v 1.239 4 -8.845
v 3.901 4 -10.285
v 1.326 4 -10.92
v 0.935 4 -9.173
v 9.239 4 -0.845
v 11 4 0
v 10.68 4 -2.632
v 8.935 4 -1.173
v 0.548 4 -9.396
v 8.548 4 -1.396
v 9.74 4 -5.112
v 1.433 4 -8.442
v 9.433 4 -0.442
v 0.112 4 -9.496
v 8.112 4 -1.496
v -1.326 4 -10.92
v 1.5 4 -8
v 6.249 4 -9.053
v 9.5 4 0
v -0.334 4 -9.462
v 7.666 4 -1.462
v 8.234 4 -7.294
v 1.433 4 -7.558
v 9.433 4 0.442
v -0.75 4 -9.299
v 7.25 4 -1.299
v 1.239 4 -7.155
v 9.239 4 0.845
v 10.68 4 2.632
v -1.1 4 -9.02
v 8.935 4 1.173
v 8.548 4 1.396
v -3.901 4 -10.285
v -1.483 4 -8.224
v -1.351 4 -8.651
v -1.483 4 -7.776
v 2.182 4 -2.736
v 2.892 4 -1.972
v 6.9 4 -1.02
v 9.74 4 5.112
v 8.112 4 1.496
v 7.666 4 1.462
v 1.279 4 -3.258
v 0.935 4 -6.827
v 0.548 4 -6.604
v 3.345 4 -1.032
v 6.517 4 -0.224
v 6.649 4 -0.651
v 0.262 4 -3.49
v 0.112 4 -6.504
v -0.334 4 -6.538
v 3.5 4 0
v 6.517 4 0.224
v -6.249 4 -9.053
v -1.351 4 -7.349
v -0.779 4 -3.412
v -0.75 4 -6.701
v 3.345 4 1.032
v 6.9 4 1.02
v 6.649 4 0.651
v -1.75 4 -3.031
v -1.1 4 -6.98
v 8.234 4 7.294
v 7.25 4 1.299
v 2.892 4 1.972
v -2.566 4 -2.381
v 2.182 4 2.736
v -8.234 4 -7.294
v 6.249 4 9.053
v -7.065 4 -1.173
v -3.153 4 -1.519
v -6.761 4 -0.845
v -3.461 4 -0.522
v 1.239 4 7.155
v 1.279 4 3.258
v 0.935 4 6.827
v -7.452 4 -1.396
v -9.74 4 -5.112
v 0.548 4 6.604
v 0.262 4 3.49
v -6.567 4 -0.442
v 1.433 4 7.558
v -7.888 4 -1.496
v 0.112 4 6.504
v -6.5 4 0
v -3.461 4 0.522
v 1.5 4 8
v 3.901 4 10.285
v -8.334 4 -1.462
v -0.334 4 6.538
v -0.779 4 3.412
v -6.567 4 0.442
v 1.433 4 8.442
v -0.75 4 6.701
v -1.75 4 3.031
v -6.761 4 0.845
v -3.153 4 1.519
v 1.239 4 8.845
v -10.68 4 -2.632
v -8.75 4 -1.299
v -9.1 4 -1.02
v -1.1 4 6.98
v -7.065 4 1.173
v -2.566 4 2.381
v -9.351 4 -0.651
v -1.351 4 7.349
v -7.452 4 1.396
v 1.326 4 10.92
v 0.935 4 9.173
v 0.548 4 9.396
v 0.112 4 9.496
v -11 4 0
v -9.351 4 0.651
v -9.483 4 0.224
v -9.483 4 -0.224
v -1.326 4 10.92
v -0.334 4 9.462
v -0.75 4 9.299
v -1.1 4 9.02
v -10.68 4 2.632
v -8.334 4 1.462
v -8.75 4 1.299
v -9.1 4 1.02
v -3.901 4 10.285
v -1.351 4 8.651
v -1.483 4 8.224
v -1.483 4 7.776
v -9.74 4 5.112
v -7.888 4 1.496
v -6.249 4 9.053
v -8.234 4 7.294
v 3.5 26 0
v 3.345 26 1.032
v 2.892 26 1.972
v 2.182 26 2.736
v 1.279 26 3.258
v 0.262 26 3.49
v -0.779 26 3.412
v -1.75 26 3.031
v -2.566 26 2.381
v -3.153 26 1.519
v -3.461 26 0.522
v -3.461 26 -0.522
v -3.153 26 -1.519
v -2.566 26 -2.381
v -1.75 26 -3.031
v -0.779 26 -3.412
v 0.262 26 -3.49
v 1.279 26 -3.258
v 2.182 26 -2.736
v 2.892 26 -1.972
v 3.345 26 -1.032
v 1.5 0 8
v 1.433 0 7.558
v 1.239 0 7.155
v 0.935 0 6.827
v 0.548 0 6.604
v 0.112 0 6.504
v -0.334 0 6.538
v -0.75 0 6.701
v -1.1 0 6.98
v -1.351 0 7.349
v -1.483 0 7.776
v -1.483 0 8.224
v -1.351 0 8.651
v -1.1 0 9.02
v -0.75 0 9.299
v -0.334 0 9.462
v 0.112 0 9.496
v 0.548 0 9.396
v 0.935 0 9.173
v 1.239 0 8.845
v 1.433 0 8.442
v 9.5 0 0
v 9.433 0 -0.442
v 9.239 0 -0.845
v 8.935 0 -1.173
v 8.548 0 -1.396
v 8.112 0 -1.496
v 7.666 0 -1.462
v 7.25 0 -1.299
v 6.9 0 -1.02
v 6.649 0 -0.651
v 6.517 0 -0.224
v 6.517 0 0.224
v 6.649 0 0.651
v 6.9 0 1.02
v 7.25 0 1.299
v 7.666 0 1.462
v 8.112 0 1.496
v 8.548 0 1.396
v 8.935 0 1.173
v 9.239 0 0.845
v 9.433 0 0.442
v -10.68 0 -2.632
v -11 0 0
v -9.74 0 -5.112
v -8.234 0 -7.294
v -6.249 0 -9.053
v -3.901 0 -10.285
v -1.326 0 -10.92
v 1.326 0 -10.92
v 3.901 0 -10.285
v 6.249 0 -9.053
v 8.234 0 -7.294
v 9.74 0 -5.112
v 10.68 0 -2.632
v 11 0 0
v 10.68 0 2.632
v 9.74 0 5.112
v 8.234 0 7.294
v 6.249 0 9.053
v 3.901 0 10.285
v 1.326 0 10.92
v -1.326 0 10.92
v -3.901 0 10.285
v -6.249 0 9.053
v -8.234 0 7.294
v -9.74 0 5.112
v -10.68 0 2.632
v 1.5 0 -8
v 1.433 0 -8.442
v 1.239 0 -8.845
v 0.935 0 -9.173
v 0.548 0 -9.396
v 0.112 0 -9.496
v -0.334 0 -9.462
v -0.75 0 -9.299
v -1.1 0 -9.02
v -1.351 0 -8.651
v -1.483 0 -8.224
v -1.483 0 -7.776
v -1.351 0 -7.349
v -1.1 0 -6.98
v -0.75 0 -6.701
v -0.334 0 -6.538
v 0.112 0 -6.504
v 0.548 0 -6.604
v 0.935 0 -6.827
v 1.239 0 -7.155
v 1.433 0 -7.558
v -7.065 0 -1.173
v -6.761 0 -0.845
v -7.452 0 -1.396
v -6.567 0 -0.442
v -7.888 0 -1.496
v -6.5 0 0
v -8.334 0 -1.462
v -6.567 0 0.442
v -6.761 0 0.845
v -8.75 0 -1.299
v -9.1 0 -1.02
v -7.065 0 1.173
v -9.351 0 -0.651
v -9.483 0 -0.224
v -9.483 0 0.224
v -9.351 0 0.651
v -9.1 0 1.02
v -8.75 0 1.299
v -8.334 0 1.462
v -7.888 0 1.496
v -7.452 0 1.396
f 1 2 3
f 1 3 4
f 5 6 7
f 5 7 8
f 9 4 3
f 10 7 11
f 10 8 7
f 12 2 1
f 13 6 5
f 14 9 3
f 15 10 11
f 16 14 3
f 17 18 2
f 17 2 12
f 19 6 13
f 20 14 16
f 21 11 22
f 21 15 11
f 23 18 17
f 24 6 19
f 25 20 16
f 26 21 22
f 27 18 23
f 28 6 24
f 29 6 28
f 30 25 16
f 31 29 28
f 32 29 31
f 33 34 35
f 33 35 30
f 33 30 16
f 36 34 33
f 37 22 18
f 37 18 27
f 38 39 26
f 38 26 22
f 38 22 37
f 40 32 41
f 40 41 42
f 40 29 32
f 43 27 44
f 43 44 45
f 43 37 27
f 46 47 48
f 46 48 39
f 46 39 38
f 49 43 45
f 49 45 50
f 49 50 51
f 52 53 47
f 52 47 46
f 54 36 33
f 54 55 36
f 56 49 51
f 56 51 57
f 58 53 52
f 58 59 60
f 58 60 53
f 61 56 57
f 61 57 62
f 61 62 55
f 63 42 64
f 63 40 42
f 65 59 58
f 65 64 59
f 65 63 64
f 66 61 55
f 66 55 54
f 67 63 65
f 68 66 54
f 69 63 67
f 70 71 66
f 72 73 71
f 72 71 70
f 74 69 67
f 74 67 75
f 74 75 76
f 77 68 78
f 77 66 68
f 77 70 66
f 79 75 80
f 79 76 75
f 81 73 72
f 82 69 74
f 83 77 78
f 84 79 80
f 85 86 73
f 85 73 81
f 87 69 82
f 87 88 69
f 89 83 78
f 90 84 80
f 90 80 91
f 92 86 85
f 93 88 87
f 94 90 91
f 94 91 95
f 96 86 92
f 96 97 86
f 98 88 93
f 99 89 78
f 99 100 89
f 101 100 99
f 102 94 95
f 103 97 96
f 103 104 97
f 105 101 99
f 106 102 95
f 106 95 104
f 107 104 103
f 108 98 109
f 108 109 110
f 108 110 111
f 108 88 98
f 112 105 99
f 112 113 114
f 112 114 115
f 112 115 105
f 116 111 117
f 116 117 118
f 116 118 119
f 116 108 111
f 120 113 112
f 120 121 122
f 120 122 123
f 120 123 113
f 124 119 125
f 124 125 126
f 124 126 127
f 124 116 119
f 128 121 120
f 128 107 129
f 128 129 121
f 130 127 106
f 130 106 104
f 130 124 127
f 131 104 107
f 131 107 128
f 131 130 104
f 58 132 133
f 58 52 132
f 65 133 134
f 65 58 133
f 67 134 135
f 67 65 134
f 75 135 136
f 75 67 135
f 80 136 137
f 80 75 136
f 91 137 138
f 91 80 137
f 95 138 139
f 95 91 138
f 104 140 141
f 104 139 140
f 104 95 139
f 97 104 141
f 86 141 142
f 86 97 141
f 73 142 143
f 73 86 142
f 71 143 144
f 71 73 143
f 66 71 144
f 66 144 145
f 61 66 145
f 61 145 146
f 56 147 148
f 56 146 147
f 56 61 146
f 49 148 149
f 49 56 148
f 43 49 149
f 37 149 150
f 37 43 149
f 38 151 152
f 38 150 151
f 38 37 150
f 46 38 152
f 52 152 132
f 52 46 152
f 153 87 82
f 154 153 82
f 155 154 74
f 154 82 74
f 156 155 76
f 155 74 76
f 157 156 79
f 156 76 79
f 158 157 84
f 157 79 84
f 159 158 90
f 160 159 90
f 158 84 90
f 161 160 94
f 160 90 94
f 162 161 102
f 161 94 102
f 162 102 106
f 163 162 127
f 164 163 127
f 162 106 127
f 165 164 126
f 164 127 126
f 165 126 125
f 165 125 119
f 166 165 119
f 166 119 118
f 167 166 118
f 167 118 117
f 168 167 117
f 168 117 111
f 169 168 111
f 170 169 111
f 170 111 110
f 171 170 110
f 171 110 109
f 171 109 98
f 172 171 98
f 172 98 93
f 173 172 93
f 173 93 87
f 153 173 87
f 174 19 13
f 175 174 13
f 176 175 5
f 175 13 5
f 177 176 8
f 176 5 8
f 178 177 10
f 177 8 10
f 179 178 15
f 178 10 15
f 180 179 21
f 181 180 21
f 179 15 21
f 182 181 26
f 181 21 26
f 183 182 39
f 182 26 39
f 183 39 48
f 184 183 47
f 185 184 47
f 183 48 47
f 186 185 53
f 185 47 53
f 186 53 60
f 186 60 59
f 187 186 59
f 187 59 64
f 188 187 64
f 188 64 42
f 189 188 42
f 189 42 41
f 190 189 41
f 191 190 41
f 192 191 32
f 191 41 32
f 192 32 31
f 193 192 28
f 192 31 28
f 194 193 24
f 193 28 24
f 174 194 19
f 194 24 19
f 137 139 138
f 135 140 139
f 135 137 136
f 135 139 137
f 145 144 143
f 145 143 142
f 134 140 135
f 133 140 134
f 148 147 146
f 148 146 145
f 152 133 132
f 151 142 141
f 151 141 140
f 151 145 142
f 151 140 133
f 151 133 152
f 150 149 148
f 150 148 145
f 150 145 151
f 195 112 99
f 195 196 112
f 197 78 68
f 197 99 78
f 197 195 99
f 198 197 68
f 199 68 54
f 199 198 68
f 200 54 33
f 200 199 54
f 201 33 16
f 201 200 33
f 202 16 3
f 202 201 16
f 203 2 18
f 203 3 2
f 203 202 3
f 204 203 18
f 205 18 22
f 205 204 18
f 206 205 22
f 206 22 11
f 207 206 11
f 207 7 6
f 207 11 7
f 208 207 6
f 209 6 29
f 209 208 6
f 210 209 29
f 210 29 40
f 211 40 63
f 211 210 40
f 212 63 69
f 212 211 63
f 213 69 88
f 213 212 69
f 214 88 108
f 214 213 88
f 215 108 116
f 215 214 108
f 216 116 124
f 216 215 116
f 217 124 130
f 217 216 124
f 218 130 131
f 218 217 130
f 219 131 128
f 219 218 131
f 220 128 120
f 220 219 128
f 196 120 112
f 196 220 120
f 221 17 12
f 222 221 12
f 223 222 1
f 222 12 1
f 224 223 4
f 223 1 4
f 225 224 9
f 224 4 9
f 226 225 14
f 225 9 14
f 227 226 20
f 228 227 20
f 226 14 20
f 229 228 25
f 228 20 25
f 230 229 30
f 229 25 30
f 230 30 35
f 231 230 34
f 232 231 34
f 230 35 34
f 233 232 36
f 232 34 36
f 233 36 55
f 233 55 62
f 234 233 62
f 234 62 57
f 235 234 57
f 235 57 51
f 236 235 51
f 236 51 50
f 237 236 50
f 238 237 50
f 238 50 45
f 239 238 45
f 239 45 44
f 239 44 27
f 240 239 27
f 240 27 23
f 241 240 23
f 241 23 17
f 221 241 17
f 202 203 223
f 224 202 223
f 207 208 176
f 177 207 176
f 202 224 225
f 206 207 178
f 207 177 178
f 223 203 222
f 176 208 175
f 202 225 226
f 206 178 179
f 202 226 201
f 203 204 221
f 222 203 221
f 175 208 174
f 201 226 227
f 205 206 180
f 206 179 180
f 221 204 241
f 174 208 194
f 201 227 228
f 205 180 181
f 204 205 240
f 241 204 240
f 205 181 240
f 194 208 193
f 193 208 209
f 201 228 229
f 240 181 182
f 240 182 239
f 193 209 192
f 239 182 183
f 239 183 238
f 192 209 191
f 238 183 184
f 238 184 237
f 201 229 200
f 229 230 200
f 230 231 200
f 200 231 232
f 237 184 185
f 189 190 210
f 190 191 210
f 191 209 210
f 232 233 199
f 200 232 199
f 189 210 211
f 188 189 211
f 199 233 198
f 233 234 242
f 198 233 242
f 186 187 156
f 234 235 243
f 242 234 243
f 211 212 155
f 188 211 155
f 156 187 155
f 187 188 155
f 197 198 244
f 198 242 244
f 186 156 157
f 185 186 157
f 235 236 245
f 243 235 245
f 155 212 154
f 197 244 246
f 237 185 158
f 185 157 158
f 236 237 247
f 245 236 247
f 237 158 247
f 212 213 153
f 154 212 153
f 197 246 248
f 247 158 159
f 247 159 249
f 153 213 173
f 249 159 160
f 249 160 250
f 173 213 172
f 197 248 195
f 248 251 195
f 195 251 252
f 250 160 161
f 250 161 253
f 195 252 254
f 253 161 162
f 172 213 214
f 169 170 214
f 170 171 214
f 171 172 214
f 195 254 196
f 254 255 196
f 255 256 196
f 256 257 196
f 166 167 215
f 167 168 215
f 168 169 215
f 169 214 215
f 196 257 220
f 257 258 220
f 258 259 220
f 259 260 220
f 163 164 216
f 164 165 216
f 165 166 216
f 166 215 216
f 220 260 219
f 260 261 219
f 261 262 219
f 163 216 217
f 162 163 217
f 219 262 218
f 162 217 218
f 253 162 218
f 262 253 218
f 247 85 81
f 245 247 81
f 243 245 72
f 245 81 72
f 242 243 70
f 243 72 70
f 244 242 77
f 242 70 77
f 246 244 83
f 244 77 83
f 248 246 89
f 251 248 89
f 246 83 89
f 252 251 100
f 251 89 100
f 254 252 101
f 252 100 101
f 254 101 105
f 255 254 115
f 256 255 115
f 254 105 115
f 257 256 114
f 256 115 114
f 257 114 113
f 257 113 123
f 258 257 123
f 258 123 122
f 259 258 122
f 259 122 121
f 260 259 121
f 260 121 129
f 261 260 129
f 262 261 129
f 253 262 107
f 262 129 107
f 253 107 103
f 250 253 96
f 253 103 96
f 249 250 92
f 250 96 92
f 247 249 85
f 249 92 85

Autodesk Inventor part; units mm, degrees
ref_plane "YZ Plane" through (0, 0, 0) normal (1, 0, 0) x (0, 1, 0)
ref_plane "XZ Plane" through (0, 0, 0) normal (0, 1, 0) x (-1, 0, 0)
ref_plane "XY Plane" through (0, 0, 0) normal (0, 0, 1) x (1, 0, 0)
sketch "Boceto1" plane through (0, 0, 0) normal (0, 1, 0) x (-1, 0, 0)
  circle A0 centre (0, 0) radius 11
  dimension "d0" = 22
extrude "Extrusión1" add sketch "Boceto1" along normal blind 4
sketch "Boceto2" plane through (0, 4, 0) normal (0, 1, 0) x (1, 0, 0)
  circle A0 centre (0, 0) radius 8
  circle A1 centre (-8, 0) radius 1.5
  circle A2 centre (0, -8) radius 1.5
  circle A3 centre (8, 0) radius 1.5
  circle A4 centre (0, 8) radius 1.5
  dimension "d3" = 16
  dimension "d4" = 3
  dimension "d7" = 360
extrude "Extrusión2" cut sketch "Boceto2" against normal blind 4 contours A0 A3 | A0 A3 | A4 A0 | A0 A4 | A2 A0 | A0 A2 | A1 A0 | A0 A1
sketch "Boceto3" plane through (0, 4, 0) normal (0, 1, 0) x (1, 0, 0)
  circle A0 centre (0, 0) radius 3.5
  dimension "d11" = 7
extrude "Extrusión3" add sketch "Boceto3" along normal blind 22
properties part number "eje_base"
